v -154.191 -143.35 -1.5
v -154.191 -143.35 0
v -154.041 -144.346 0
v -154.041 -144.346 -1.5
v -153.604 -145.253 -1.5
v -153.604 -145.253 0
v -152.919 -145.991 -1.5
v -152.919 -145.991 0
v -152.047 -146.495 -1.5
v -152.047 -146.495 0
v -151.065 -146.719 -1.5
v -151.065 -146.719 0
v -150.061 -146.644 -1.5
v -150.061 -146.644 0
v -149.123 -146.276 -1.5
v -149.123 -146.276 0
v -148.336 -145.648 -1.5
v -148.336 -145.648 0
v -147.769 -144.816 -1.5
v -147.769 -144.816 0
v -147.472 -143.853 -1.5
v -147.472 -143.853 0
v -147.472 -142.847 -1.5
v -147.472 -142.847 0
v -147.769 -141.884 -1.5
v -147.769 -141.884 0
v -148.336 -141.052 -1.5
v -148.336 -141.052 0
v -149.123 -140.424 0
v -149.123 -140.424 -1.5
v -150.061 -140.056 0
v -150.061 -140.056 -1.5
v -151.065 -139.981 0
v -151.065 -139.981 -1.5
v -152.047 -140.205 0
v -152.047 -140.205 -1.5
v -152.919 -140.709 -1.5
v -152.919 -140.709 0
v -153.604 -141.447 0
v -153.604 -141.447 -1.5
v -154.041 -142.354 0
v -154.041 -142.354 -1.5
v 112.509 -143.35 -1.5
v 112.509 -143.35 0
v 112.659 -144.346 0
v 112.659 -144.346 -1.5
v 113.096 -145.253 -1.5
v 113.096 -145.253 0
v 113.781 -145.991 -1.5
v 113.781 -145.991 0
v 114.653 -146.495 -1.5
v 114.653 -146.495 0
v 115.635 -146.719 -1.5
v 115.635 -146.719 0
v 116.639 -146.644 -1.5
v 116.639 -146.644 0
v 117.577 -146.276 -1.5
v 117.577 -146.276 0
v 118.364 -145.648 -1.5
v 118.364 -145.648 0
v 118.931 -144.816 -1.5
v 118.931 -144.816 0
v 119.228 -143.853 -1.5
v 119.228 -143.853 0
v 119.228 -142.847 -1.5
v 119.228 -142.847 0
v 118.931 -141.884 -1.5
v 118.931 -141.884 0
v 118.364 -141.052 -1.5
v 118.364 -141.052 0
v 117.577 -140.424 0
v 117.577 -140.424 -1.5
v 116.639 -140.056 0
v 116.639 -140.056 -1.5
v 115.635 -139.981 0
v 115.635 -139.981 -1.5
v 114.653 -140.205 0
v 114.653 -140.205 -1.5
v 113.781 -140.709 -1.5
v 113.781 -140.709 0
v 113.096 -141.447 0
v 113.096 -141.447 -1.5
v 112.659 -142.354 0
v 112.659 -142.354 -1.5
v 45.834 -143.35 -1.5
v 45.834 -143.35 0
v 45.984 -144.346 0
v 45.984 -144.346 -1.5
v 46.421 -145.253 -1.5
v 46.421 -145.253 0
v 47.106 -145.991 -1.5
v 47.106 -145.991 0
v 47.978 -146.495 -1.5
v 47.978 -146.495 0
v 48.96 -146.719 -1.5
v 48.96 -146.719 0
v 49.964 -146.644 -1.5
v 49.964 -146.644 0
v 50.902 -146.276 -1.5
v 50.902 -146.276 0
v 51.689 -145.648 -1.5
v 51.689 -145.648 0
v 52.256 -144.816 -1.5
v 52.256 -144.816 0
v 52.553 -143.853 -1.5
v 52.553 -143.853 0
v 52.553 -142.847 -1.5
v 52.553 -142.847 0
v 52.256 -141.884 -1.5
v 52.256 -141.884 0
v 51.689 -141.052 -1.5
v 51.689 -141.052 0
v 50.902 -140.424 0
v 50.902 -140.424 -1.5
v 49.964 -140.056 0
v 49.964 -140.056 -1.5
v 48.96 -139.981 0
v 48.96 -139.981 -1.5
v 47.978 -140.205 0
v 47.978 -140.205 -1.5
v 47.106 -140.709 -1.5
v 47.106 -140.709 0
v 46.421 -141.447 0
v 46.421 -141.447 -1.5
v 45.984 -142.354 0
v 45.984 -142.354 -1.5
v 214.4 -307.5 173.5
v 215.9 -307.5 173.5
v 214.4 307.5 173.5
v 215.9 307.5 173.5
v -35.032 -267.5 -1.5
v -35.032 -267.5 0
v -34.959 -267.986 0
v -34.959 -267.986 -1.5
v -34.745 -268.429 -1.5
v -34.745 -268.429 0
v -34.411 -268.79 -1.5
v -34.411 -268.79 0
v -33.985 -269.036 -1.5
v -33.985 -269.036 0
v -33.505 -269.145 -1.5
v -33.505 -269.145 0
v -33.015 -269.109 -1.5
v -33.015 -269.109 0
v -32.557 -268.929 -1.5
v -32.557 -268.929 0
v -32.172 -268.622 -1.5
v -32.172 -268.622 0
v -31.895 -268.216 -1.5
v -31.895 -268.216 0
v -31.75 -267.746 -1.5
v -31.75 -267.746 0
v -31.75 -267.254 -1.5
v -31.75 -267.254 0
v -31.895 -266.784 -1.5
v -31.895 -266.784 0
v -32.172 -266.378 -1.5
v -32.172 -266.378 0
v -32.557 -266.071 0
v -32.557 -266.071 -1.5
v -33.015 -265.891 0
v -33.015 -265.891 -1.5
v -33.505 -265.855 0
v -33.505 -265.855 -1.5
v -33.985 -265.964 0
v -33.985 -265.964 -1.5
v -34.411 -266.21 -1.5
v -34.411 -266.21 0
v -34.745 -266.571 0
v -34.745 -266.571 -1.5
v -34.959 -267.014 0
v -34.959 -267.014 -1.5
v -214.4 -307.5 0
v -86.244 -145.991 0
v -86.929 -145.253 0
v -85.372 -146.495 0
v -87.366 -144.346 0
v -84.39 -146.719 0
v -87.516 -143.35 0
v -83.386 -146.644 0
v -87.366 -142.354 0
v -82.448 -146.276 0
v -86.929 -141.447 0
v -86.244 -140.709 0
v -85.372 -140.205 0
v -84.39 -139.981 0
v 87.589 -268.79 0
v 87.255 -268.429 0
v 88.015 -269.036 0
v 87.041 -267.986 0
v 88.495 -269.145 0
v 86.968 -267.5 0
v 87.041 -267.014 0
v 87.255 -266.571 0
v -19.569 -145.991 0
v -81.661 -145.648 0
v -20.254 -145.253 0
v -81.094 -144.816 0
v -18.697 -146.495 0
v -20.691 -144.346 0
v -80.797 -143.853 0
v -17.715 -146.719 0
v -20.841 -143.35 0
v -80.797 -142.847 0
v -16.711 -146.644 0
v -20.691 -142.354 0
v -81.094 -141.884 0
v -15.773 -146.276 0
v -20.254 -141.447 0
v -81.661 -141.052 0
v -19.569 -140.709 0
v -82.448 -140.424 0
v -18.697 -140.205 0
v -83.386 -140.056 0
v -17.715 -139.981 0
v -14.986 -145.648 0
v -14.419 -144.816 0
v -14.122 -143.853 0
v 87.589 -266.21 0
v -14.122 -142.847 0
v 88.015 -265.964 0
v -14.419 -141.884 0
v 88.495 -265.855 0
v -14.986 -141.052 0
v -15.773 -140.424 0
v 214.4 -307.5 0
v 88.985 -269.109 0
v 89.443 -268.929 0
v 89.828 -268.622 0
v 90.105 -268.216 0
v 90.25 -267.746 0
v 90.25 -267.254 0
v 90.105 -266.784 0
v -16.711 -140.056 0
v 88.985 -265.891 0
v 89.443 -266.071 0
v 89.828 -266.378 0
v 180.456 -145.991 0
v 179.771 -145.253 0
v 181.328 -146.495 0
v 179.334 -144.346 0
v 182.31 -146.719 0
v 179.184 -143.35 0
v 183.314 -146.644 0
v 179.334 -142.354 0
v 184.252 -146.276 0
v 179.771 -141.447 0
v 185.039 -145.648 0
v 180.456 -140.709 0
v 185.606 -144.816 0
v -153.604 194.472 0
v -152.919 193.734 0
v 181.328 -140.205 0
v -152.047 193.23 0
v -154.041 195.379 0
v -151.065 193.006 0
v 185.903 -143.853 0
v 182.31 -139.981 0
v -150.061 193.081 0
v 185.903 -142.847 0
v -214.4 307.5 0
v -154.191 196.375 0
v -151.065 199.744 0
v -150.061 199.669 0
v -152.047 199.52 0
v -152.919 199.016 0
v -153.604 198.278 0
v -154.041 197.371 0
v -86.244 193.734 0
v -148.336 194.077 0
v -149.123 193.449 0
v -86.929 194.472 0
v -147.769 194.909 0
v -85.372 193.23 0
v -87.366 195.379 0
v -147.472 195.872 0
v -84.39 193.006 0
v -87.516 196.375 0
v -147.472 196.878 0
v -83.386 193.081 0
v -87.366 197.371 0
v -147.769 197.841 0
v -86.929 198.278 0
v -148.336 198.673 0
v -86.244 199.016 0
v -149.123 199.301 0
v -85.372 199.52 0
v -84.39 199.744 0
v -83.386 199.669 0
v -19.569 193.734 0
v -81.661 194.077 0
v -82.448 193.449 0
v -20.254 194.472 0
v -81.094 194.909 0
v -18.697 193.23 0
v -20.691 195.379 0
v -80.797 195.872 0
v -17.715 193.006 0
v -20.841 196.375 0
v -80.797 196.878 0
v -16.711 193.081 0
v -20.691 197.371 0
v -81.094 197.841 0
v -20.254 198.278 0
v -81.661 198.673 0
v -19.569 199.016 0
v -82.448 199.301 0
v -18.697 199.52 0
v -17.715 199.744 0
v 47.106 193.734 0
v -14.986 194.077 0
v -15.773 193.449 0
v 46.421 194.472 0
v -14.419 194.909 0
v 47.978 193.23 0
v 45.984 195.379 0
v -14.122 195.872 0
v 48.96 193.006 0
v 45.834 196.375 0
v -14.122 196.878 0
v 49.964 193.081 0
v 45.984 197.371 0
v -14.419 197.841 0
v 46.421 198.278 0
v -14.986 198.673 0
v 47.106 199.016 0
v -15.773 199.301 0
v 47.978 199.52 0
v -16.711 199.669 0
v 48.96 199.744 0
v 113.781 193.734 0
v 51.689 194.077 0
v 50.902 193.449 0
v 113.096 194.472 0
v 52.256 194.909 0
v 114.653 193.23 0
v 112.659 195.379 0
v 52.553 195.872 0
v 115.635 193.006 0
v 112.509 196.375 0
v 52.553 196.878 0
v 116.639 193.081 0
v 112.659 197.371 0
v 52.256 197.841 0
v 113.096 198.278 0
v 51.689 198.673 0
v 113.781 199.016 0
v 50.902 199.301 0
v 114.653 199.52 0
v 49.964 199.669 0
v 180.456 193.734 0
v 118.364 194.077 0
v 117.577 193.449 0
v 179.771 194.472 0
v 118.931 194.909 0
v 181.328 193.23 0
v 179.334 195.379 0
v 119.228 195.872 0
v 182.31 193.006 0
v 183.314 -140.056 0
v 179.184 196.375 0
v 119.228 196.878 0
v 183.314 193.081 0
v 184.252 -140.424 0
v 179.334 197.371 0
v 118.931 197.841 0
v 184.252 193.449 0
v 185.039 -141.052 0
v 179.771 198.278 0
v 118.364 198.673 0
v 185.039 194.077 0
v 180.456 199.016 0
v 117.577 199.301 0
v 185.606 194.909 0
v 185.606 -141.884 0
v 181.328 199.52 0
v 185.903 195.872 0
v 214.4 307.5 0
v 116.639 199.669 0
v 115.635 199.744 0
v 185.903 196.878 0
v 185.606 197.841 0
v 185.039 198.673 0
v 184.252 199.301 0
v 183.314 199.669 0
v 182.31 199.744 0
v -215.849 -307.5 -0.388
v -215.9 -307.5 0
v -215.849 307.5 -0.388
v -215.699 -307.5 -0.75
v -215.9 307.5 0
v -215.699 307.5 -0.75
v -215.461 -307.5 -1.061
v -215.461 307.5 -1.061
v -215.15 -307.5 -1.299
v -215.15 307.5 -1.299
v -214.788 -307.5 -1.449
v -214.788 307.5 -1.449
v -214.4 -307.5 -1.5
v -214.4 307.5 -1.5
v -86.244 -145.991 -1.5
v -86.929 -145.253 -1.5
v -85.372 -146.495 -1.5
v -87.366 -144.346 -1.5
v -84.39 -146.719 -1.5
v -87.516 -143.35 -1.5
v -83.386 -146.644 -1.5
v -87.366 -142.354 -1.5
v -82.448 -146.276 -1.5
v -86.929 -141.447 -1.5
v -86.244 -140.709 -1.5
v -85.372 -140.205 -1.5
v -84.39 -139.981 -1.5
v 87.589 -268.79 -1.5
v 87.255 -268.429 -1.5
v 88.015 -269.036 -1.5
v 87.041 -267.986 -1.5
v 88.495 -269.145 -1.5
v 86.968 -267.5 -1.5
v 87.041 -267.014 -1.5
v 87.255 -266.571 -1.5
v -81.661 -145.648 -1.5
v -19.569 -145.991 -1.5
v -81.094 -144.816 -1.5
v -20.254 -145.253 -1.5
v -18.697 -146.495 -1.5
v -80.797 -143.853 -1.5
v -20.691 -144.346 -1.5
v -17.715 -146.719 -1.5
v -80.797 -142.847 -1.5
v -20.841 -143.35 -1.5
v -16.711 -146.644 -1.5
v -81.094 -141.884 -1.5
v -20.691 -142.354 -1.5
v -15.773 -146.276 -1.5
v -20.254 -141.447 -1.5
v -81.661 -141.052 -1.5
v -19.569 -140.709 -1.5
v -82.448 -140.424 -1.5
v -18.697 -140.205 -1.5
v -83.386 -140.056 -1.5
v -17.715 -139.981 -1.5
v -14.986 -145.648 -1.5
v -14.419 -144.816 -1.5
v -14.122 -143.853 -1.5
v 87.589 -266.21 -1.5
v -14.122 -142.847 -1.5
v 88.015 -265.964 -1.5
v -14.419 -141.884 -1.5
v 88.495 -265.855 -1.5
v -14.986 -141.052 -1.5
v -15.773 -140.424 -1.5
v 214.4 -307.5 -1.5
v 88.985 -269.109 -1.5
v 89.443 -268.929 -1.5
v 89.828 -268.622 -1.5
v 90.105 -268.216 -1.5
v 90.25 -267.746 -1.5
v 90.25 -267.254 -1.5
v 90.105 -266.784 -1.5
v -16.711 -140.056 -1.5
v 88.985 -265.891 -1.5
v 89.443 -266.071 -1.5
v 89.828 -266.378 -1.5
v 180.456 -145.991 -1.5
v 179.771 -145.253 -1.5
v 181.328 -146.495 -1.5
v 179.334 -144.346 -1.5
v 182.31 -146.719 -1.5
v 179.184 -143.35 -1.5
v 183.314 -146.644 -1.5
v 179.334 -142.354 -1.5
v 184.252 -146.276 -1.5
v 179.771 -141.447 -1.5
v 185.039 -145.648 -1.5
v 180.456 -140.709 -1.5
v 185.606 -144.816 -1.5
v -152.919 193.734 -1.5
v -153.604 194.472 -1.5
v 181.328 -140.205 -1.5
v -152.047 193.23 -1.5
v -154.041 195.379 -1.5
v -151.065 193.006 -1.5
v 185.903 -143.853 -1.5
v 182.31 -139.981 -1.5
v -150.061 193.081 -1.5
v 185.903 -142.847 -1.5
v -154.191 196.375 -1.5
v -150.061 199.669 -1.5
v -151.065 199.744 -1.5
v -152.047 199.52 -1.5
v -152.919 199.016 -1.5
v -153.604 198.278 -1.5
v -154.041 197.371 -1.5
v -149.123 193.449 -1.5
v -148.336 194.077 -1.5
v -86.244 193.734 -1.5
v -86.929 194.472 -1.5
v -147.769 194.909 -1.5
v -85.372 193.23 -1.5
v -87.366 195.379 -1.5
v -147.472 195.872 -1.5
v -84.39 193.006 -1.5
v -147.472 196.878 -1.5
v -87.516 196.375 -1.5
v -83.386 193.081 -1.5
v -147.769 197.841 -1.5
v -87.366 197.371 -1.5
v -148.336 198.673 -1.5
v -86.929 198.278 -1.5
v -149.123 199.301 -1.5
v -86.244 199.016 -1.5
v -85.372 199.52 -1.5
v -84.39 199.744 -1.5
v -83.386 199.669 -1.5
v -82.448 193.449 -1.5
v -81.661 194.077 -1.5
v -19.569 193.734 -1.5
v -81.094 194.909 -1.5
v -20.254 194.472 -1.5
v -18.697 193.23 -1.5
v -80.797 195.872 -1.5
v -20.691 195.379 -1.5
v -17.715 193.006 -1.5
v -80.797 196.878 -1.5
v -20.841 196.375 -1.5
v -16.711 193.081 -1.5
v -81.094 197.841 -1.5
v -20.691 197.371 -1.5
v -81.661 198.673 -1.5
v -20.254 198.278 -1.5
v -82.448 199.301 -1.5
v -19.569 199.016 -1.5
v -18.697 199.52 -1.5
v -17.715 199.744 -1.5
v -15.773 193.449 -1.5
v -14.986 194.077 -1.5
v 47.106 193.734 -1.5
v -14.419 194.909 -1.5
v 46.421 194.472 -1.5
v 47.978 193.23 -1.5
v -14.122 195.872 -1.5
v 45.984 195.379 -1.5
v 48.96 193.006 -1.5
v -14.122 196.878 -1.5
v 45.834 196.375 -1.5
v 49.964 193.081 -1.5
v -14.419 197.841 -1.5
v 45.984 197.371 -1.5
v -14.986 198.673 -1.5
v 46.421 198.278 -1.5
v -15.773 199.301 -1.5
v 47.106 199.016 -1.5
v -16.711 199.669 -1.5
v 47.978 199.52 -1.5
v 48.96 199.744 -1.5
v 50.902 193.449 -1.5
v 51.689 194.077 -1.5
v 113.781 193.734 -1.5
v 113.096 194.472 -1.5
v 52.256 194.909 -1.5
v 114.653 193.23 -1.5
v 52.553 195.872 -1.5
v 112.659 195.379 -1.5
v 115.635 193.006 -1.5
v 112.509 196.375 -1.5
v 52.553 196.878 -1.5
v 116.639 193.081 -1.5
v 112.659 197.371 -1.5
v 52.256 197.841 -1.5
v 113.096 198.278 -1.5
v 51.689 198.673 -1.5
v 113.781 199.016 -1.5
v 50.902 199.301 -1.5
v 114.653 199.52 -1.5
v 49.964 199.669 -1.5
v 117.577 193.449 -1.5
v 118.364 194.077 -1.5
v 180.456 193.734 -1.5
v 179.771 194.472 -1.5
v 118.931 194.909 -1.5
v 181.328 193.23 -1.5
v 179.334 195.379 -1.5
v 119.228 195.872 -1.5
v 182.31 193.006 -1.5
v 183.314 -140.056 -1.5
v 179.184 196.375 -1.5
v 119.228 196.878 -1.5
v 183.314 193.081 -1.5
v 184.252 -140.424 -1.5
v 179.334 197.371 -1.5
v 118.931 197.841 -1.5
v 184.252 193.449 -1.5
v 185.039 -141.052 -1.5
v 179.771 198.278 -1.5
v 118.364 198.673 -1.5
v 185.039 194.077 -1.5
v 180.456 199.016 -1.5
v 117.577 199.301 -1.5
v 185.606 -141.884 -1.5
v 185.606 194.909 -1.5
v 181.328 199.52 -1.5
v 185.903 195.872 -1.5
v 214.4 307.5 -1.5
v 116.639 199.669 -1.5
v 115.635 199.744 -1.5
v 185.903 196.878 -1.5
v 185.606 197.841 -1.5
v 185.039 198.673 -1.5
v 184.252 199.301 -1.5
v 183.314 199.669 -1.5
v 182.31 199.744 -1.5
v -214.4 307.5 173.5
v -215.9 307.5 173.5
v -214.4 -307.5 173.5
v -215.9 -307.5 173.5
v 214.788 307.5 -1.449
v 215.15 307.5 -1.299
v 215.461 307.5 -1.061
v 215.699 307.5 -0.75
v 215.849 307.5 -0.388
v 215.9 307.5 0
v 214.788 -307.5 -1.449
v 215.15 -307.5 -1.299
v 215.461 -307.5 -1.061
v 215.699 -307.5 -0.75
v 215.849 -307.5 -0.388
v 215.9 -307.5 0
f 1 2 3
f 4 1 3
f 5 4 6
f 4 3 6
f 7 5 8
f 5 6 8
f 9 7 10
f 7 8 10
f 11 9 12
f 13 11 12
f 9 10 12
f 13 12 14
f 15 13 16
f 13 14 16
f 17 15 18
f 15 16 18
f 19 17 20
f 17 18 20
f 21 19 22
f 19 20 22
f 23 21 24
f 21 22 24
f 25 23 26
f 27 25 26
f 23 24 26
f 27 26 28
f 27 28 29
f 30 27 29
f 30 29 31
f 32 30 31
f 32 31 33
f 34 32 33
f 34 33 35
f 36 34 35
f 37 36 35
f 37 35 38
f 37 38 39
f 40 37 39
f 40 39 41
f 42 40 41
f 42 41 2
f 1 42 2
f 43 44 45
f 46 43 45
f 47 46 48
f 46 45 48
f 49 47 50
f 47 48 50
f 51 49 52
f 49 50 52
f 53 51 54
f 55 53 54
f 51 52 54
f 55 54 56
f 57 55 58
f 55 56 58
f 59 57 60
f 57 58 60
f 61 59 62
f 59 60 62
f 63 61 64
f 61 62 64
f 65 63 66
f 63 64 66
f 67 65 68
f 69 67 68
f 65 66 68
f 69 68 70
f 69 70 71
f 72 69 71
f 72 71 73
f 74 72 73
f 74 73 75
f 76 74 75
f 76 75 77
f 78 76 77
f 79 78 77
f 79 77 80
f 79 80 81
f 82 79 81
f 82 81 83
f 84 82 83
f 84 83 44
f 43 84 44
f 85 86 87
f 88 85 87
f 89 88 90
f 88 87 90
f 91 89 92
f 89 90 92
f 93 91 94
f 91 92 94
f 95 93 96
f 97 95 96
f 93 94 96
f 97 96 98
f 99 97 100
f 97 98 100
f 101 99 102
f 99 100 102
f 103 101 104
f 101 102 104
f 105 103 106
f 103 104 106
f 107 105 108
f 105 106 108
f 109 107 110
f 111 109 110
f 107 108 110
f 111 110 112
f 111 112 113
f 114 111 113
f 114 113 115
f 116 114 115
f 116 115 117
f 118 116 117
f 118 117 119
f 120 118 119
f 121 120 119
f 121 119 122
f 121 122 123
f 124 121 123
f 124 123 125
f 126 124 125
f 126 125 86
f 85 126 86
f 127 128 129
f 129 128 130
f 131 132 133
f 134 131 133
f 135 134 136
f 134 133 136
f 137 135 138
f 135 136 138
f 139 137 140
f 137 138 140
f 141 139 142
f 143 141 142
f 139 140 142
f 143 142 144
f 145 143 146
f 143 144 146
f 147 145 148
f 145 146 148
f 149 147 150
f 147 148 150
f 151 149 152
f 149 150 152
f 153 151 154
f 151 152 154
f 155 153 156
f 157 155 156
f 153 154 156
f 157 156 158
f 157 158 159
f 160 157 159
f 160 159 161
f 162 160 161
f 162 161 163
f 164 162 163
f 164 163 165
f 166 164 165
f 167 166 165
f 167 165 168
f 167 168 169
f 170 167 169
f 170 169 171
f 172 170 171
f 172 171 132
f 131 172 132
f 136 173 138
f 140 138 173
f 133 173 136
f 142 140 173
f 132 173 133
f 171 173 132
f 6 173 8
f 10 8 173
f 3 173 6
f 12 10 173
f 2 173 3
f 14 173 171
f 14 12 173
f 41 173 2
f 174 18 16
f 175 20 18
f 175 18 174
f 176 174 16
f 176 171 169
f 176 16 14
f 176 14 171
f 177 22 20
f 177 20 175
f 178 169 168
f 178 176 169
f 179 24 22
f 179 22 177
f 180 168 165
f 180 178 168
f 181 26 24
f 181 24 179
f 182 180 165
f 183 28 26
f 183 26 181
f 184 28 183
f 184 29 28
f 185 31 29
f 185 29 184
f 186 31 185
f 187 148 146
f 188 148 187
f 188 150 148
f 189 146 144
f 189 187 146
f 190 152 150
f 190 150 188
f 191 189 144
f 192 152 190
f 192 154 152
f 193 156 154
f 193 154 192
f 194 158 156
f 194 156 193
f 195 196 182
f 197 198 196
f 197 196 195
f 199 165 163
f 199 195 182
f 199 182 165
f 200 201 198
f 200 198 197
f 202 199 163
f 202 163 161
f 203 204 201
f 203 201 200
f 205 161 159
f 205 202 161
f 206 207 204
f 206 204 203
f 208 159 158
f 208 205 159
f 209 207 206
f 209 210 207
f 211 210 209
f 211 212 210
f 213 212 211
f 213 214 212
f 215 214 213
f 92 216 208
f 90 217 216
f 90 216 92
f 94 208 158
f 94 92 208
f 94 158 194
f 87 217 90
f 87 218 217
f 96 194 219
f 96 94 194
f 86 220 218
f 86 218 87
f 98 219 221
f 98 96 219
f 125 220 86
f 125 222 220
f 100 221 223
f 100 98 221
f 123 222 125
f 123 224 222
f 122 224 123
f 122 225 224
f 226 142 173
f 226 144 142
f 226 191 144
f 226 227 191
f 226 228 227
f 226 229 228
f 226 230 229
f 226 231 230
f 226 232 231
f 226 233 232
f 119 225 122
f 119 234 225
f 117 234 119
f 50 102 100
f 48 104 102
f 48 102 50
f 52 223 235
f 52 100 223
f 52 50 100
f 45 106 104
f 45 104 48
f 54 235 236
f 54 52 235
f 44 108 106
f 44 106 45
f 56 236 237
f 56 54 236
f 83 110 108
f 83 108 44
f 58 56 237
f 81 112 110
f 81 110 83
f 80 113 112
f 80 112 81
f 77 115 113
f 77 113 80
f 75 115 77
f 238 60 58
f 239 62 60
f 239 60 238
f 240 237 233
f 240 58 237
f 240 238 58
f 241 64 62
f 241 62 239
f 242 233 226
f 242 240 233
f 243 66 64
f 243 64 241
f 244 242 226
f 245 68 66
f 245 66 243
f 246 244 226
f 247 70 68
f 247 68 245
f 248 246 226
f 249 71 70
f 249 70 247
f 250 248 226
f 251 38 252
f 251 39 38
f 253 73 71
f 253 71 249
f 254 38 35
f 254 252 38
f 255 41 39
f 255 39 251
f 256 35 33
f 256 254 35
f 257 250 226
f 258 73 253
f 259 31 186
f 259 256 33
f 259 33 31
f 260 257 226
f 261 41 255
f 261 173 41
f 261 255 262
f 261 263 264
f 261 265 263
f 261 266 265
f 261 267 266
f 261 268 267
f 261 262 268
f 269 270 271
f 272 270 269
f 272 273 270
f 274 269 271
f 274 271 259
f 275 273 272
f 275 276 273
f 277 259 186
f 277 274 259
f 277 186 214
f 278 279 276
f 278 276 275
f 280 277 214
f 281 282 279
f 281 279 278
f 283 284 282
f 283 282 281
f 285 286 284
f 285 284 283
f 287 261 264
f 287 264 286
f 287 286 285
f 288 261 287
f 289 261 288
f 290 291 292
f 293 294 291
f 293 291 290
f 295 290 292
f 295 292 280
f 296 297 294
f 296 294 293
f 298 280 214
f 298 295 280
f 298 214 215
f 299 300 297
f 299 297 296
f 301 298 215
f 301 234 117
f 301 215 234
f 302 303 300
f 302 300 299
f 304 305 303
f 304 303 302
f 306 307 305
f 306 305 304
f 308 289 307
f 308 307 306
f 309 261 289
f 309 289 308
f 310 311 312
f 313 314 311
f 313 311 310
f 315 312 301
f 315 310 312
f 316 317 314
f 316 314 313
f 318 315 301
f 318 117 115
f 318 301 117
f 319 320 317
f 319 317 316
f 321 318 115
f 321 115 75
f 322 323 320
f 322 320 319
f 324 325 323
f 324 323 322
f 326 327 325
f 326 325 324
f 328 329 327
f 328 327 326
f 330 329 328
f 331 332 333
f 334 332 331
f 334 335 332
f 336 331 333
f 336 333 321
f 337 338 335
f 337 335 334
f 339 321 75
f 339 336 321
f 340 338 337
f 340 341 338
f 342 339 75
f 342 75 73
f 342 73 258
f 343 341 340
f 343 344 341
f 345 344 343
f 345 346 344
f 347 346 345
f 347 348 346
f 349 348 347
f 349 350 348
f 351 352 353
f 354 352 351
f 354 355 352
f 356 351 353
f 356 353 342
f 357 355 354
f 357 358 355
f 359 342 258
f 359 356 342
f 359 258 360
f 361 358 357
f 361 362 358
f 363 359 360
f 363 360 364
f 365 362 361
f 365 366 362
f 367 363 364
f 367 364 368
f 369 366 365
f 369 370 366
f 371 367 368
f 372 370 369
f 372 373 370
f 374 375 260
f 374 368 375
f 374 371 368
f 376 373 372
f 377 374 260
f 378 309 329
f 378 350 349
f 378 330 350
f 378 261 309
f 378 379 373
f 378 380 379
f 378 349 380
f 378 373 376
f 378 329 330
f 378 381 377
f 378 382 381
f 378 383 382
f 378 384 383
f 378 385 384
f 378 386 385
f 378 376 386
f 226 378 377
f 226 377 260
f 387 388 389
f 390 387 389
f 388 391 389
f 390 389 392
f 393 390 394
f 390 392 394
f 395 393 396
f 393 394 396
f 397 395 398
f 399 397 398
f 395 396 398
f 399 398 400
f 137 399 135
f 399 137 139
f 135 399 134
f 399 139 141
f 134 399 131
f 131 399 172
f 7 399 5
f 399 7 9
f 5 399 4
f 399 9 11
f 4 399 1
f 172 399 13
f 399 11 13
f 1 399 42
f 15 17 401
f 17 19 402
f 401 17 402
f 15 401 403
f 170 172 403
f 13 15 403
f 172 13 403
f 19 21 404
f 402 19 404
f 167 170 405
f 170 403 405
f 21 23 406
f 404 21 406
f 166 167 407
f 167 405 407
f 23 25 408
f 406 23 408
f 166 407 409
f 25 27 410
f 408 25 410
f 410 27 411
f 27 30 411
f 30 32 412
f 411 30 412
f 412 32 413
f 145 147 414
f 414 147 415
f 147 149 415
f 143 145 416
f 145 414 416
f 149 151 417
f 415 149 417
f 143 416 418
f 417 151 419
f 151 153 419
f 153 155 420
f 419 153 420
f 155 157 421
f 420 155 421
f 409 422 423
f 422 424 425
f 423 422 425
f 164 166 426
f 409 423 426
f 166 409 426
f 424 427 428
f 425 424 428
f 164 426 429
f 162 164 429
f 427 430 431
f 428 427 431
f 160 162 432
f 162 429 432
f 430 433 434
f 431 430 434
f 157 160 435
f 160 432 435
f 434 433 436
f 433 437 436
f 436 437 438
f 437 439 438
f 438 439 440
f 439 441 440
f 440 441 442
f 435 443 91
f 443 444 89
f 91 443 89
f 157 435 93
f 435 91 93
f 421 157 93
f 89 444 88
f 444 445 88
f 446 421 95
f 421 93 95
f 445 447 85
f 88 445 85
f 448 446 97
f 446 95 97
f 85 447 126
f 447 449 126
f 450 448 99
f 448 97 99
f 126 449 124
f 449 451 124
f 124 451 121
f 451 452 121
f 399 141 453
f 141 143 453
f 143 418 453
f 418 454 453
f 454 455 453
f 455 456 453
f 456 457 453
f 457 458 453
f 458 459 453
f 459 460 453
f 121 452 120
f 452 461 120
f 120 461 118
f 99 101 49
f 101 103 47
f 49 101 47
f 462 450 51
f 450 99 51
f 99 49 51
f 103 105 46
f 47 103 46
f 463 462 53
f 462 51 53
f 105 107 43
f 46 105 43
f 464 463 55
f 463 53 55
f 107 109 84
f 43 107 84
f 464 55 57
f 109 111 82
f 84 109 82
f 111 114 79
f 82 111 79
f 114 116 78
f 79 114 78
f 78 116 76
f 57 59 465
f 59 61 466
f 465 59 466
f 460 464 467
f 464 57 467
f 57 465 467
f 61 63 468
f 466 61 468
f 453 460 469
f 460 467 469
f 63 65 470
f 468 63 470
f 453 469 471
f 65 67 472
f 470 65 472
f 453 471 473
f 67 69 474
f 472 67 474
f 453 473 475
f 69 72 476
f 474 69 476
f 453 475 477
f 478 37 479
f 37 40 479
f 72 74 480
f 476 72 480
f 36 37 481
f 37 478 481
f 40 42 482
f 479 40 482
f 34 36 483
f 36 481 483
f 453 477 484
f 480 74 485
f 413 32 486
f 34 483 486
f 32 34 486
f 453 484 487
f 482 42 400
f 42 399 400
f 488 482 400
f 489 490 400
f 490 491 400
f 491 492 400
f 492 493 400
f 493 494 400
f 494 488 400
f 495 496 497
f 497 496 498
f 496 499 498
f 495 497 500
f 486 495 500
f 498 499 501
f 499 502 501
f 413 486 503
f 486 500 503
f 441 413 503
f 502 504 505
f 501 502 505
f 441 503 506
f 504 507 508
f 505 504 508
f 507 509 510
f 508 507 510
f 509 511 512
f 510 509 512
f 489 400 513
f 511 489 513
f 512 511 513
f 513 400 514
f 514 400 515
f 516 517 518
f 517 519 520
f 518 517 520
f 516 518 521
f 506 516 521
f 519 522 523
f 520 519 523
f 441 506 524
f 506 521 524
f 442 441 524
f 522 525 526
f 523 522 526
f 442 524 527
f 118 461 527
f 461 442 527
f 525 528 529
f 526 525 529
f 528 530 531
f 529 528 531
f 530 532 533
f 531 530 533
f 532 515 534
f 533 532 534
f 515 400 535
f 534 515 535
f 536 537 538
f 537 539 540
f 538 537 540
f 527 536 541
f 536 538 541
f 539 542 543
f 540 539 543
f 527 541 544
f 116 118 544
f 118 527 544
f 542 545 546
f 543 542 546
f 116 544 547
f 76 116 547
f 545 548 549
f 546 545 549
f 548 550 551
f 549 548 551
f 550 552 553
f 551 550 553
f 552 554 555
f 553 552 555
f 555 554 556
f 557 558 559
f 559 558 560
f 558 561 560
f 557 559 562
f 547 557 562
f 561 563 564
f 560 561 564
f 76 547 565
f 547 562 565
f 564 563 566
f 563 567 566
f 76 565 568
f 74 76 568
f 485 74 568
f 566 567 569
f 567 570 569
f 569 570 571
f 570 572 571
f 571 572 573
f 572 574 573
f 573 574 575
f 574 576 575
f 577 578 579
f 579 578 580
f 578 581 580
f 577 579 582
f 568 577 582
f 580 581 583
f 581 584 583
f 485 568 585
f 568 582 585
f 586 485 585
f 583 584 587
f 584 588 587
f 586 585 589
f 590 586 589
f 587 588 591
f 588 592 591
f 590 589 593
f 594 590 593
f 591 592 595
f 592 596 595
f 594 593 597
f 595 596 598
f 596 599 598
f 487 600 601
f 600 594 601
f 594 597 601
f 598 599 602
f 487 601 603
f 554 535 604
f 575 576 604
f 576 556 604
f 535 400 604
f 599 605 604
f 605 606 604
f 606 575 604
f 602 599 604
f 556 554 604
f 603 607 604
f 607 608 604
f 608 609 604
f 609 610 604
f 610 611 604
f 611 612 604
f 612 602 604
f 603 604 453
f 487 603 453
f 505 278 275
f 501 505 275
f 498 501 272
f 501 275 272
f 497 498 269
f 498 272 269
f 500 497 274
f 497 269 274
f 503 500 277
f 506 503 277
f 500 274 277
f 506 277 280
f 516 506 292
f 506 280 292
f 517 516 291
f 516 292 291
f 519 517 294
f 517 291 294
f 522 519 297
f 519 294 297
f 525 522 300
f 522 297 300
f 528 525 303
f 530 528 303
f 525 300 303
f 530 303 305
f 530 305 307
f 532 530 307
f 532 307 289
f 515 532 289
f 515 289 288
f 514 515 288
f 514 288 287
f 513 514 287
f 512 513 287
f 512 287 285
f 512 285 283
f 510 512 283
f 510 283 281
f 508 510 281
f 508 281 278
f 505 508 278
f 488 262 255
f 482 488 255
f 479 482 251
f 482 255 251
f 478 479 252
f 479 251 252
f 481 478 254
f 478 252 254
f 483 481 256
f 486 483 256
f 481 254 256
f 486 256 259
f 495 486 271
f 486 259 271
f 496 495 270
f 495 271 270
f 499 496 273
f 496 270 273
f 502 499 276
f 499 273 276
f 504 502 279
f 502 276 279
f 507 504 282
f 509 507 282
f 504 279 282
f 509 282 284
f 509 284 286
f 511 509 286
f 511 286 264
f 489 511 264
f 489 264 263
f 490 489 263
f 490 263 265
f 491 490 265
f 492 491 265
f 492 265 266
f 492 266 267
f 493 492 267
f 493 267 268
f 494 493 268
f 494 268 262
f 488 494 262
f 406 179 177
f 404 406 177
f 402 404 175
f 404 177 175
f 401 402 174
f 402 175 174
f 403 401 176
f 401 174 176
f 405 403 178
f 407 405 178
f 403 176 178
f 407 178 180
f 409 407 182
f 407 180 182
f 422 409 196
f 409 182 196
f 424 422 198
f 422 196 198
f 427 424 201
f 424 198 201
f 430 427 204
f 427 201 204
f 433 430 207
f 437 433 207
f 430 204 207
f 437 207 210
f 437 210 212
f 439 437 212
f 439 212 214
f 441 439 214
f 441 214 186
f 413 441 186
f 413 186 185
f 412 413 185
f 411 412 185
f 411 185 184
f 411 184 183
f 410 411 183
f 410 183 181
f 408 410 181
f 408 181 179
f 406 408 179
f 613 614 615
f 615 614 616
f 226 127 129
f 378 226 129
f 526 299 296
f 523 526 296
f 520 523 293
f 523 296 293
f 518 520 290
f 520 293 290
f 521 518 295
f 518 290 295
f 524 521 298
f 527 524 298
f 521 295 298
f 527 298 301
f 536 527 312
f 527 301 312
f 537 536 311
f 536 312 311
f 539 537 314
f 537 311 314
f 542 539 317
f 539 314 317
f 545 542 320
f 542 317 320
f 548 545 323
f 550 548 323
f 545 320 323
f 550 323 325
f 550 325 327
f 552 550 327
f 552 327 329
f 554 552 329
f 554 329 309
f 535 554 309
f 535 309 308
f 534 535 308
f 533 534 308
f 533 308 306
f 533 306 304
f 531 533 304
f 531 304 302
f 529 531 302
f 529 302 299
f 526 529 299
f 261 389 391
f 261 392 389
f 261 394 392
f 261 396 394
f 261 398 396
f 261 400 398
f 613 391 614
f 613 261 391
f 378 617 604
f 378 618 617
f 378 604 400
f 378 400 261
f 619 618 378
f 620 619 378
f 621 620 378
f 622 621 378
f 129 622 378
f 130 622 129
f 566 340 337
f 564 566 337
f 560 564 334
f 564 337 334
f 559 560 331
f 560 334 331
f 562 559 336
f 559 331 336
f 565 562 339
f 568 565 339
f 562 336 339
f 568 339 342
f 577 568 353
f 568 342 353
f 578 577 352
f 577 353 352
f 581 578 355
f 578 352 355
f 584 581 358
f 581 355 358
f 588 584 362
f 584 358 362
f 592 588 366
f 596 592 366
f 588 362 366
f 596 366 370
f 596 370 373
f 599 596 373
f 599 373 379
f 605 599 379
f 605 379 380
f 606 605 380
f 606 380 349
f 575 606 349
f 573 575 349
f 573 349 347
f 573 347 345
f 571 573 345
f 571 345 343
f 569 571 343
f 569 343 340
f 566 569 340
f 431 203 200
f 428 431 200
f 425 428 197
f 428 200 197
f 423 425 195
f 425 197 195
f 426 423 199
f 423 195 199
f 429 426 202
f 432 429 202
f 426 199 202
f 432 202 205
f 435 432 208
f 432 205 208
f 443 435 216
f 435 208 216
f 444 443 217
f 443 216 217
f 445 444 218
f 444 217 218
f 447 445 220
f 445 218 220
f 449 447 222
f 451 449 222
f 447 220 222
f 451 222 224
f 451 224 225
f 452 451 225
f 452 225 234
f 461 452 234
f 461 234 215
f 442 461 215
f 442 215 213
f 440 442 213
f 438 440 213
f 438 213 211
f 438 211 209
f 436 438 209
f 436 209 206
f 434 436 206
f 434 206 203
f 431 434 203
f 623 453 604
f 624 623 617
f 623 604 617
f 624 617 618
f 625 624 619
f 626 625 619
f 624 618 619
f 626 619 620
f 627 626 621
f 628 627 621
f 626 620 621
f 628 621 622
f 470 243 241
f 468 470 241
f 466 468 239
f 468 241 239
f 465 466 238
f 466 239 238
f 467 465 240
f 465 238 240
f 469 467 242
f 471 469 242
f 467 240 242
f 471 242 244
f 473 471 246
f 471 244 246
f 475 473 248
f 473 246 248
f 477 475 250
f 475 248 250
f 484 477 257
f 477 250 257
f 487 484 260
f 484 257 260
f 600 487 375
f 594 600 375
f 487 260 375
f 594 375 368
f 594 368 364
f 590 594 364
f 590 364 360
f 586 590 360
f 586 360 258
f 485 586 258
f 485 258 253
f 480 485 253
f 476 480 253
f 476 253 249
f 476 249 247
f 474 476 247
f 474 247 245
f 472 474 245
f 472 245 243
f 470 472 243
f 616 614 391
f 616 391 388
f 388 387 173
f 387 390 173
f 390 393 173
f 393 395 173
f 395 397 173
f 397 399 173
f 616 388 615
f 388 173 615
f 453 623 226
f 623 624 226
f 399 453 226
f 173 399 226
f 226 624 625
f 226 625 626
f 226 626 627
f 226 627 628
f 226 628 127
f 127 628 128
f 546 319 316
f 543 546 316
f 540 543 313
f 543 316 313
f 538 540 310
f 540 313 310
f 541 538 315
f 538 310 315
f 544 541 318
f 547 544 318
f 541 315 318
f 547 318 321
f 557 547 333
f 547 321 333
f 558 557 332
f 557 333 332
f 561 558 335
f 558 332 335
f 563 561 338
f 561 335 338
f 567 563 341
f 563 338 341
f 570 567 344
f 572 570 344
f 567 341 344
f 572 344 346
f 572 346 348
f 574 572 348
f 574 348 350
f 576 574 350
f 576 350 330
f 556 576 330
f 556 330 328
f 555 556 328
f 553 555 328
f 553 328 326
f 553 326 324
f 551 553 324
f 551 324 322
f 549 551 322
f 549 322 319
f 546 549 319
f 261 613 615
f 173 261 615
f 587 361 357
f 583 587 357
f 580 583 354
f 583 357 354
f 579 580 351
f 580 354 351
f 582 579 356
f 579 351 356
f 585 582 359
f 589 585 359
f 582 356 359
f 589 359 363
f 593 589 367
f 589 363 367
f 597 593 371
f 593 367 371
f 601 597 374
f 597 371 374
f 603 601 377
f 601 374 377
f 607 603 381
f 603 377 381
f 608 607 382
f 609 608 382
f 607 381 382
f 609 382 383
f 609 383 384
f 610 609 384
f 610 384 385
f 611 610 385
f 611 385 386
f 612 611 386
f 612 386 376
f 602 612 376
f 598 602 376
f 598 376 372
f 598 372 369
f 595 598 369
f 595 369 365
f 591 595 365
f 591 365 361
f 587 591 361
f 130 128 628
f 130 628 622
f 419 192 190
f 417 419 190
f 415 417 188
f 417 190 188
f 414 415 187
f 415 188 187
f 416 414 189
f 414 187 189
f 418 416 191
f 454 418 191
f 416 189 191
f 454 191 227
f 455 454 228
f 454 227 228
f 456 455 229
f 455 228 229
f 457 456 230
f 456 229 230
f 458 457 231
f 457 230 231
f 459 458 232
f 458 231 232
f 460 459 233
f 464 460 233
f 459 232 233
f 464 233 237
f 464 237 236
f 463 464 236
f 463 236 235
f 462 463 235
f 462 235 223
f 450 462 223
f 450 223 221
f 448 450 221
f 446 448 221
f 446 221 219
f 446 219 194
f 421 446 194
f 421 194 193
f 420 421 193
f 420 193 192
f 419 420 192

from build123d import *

# Parameters (mm, degrees)
F0_W     = 431.8
F0_H     = 615
F1_DEPTH = 1.5
F2_W     = 615
F2_H     = 173.5
F3_DEPTH = 1.5
F4_W     = 615
F4_H     = 173.5
F5_DEPTH = 1.5
F6_R     = 1.5
F8_D     = 6.7564
F9_D     = 3.3


with BuildPart() as f1:
    # F0 (on Top) → F1 (new body)
    with BuildSketch(Plane.XY):
        Rectangle(F0_W, F0_H)
    extrude(amount=-F1_DEPTH)

    # F2 (on face) → F3 (join)
    with BuildSketch(Plane(origin=(-215.9, 0, 0), x_dir=(0, -1, 0), z_dir=(-1, 0, 0))):
        with Locations((0, 86.75)):
            Rectangle(F2_W, F2_H)
    extrude(amount=-F3_DEPTH)

    # F4 (on face) → F5 (join)
    with BuildSketch(Plane.YZ.offset(215.9)):
        with Locations((0, 86.75)):
            Rectangle(F4_W, F4_H)
    extrude(amount=-F5_DEPTH)

    # F6
    f6_edges = [f1.edges().sort_by_distance(p)[0] for p in [
        (-215.9, 0, -1.5),
        (215.9, 0, -1.5),
    ]]
    fillet(f6_edges, radius=F6_R)

    # F8 (through all)
    with Locations(Plane(origin=(0, 0, -1.5), x_dir=(1, 0, 0), z_dir=(0, 0, -1))):
        with Locations((-84.1375, 143.35), (-17.4625, 143.35), (49.2125, 143.35), (115.8875, 143.35), (182.5625, 143.35), (182.5625, -196.375), (115.8875, -196.375), (49.2125, -196.375), (-17.4625, -196.375), (-84.1375, -196.375), (-150.8125, -196.375), (-150.8125, 143.35)):
            Hole(F8_D / 2)

    # F9 (through all)
    with Locations(Plane(origin=(0, 0, -1.5), x_dir=(1, 0, 0), z_dir=(0, 0, -1))):
        with Locations((-33.382, 267.5), (88.618, 267.5)):
            Hole(F9_D / 2)


solid = f1.part
